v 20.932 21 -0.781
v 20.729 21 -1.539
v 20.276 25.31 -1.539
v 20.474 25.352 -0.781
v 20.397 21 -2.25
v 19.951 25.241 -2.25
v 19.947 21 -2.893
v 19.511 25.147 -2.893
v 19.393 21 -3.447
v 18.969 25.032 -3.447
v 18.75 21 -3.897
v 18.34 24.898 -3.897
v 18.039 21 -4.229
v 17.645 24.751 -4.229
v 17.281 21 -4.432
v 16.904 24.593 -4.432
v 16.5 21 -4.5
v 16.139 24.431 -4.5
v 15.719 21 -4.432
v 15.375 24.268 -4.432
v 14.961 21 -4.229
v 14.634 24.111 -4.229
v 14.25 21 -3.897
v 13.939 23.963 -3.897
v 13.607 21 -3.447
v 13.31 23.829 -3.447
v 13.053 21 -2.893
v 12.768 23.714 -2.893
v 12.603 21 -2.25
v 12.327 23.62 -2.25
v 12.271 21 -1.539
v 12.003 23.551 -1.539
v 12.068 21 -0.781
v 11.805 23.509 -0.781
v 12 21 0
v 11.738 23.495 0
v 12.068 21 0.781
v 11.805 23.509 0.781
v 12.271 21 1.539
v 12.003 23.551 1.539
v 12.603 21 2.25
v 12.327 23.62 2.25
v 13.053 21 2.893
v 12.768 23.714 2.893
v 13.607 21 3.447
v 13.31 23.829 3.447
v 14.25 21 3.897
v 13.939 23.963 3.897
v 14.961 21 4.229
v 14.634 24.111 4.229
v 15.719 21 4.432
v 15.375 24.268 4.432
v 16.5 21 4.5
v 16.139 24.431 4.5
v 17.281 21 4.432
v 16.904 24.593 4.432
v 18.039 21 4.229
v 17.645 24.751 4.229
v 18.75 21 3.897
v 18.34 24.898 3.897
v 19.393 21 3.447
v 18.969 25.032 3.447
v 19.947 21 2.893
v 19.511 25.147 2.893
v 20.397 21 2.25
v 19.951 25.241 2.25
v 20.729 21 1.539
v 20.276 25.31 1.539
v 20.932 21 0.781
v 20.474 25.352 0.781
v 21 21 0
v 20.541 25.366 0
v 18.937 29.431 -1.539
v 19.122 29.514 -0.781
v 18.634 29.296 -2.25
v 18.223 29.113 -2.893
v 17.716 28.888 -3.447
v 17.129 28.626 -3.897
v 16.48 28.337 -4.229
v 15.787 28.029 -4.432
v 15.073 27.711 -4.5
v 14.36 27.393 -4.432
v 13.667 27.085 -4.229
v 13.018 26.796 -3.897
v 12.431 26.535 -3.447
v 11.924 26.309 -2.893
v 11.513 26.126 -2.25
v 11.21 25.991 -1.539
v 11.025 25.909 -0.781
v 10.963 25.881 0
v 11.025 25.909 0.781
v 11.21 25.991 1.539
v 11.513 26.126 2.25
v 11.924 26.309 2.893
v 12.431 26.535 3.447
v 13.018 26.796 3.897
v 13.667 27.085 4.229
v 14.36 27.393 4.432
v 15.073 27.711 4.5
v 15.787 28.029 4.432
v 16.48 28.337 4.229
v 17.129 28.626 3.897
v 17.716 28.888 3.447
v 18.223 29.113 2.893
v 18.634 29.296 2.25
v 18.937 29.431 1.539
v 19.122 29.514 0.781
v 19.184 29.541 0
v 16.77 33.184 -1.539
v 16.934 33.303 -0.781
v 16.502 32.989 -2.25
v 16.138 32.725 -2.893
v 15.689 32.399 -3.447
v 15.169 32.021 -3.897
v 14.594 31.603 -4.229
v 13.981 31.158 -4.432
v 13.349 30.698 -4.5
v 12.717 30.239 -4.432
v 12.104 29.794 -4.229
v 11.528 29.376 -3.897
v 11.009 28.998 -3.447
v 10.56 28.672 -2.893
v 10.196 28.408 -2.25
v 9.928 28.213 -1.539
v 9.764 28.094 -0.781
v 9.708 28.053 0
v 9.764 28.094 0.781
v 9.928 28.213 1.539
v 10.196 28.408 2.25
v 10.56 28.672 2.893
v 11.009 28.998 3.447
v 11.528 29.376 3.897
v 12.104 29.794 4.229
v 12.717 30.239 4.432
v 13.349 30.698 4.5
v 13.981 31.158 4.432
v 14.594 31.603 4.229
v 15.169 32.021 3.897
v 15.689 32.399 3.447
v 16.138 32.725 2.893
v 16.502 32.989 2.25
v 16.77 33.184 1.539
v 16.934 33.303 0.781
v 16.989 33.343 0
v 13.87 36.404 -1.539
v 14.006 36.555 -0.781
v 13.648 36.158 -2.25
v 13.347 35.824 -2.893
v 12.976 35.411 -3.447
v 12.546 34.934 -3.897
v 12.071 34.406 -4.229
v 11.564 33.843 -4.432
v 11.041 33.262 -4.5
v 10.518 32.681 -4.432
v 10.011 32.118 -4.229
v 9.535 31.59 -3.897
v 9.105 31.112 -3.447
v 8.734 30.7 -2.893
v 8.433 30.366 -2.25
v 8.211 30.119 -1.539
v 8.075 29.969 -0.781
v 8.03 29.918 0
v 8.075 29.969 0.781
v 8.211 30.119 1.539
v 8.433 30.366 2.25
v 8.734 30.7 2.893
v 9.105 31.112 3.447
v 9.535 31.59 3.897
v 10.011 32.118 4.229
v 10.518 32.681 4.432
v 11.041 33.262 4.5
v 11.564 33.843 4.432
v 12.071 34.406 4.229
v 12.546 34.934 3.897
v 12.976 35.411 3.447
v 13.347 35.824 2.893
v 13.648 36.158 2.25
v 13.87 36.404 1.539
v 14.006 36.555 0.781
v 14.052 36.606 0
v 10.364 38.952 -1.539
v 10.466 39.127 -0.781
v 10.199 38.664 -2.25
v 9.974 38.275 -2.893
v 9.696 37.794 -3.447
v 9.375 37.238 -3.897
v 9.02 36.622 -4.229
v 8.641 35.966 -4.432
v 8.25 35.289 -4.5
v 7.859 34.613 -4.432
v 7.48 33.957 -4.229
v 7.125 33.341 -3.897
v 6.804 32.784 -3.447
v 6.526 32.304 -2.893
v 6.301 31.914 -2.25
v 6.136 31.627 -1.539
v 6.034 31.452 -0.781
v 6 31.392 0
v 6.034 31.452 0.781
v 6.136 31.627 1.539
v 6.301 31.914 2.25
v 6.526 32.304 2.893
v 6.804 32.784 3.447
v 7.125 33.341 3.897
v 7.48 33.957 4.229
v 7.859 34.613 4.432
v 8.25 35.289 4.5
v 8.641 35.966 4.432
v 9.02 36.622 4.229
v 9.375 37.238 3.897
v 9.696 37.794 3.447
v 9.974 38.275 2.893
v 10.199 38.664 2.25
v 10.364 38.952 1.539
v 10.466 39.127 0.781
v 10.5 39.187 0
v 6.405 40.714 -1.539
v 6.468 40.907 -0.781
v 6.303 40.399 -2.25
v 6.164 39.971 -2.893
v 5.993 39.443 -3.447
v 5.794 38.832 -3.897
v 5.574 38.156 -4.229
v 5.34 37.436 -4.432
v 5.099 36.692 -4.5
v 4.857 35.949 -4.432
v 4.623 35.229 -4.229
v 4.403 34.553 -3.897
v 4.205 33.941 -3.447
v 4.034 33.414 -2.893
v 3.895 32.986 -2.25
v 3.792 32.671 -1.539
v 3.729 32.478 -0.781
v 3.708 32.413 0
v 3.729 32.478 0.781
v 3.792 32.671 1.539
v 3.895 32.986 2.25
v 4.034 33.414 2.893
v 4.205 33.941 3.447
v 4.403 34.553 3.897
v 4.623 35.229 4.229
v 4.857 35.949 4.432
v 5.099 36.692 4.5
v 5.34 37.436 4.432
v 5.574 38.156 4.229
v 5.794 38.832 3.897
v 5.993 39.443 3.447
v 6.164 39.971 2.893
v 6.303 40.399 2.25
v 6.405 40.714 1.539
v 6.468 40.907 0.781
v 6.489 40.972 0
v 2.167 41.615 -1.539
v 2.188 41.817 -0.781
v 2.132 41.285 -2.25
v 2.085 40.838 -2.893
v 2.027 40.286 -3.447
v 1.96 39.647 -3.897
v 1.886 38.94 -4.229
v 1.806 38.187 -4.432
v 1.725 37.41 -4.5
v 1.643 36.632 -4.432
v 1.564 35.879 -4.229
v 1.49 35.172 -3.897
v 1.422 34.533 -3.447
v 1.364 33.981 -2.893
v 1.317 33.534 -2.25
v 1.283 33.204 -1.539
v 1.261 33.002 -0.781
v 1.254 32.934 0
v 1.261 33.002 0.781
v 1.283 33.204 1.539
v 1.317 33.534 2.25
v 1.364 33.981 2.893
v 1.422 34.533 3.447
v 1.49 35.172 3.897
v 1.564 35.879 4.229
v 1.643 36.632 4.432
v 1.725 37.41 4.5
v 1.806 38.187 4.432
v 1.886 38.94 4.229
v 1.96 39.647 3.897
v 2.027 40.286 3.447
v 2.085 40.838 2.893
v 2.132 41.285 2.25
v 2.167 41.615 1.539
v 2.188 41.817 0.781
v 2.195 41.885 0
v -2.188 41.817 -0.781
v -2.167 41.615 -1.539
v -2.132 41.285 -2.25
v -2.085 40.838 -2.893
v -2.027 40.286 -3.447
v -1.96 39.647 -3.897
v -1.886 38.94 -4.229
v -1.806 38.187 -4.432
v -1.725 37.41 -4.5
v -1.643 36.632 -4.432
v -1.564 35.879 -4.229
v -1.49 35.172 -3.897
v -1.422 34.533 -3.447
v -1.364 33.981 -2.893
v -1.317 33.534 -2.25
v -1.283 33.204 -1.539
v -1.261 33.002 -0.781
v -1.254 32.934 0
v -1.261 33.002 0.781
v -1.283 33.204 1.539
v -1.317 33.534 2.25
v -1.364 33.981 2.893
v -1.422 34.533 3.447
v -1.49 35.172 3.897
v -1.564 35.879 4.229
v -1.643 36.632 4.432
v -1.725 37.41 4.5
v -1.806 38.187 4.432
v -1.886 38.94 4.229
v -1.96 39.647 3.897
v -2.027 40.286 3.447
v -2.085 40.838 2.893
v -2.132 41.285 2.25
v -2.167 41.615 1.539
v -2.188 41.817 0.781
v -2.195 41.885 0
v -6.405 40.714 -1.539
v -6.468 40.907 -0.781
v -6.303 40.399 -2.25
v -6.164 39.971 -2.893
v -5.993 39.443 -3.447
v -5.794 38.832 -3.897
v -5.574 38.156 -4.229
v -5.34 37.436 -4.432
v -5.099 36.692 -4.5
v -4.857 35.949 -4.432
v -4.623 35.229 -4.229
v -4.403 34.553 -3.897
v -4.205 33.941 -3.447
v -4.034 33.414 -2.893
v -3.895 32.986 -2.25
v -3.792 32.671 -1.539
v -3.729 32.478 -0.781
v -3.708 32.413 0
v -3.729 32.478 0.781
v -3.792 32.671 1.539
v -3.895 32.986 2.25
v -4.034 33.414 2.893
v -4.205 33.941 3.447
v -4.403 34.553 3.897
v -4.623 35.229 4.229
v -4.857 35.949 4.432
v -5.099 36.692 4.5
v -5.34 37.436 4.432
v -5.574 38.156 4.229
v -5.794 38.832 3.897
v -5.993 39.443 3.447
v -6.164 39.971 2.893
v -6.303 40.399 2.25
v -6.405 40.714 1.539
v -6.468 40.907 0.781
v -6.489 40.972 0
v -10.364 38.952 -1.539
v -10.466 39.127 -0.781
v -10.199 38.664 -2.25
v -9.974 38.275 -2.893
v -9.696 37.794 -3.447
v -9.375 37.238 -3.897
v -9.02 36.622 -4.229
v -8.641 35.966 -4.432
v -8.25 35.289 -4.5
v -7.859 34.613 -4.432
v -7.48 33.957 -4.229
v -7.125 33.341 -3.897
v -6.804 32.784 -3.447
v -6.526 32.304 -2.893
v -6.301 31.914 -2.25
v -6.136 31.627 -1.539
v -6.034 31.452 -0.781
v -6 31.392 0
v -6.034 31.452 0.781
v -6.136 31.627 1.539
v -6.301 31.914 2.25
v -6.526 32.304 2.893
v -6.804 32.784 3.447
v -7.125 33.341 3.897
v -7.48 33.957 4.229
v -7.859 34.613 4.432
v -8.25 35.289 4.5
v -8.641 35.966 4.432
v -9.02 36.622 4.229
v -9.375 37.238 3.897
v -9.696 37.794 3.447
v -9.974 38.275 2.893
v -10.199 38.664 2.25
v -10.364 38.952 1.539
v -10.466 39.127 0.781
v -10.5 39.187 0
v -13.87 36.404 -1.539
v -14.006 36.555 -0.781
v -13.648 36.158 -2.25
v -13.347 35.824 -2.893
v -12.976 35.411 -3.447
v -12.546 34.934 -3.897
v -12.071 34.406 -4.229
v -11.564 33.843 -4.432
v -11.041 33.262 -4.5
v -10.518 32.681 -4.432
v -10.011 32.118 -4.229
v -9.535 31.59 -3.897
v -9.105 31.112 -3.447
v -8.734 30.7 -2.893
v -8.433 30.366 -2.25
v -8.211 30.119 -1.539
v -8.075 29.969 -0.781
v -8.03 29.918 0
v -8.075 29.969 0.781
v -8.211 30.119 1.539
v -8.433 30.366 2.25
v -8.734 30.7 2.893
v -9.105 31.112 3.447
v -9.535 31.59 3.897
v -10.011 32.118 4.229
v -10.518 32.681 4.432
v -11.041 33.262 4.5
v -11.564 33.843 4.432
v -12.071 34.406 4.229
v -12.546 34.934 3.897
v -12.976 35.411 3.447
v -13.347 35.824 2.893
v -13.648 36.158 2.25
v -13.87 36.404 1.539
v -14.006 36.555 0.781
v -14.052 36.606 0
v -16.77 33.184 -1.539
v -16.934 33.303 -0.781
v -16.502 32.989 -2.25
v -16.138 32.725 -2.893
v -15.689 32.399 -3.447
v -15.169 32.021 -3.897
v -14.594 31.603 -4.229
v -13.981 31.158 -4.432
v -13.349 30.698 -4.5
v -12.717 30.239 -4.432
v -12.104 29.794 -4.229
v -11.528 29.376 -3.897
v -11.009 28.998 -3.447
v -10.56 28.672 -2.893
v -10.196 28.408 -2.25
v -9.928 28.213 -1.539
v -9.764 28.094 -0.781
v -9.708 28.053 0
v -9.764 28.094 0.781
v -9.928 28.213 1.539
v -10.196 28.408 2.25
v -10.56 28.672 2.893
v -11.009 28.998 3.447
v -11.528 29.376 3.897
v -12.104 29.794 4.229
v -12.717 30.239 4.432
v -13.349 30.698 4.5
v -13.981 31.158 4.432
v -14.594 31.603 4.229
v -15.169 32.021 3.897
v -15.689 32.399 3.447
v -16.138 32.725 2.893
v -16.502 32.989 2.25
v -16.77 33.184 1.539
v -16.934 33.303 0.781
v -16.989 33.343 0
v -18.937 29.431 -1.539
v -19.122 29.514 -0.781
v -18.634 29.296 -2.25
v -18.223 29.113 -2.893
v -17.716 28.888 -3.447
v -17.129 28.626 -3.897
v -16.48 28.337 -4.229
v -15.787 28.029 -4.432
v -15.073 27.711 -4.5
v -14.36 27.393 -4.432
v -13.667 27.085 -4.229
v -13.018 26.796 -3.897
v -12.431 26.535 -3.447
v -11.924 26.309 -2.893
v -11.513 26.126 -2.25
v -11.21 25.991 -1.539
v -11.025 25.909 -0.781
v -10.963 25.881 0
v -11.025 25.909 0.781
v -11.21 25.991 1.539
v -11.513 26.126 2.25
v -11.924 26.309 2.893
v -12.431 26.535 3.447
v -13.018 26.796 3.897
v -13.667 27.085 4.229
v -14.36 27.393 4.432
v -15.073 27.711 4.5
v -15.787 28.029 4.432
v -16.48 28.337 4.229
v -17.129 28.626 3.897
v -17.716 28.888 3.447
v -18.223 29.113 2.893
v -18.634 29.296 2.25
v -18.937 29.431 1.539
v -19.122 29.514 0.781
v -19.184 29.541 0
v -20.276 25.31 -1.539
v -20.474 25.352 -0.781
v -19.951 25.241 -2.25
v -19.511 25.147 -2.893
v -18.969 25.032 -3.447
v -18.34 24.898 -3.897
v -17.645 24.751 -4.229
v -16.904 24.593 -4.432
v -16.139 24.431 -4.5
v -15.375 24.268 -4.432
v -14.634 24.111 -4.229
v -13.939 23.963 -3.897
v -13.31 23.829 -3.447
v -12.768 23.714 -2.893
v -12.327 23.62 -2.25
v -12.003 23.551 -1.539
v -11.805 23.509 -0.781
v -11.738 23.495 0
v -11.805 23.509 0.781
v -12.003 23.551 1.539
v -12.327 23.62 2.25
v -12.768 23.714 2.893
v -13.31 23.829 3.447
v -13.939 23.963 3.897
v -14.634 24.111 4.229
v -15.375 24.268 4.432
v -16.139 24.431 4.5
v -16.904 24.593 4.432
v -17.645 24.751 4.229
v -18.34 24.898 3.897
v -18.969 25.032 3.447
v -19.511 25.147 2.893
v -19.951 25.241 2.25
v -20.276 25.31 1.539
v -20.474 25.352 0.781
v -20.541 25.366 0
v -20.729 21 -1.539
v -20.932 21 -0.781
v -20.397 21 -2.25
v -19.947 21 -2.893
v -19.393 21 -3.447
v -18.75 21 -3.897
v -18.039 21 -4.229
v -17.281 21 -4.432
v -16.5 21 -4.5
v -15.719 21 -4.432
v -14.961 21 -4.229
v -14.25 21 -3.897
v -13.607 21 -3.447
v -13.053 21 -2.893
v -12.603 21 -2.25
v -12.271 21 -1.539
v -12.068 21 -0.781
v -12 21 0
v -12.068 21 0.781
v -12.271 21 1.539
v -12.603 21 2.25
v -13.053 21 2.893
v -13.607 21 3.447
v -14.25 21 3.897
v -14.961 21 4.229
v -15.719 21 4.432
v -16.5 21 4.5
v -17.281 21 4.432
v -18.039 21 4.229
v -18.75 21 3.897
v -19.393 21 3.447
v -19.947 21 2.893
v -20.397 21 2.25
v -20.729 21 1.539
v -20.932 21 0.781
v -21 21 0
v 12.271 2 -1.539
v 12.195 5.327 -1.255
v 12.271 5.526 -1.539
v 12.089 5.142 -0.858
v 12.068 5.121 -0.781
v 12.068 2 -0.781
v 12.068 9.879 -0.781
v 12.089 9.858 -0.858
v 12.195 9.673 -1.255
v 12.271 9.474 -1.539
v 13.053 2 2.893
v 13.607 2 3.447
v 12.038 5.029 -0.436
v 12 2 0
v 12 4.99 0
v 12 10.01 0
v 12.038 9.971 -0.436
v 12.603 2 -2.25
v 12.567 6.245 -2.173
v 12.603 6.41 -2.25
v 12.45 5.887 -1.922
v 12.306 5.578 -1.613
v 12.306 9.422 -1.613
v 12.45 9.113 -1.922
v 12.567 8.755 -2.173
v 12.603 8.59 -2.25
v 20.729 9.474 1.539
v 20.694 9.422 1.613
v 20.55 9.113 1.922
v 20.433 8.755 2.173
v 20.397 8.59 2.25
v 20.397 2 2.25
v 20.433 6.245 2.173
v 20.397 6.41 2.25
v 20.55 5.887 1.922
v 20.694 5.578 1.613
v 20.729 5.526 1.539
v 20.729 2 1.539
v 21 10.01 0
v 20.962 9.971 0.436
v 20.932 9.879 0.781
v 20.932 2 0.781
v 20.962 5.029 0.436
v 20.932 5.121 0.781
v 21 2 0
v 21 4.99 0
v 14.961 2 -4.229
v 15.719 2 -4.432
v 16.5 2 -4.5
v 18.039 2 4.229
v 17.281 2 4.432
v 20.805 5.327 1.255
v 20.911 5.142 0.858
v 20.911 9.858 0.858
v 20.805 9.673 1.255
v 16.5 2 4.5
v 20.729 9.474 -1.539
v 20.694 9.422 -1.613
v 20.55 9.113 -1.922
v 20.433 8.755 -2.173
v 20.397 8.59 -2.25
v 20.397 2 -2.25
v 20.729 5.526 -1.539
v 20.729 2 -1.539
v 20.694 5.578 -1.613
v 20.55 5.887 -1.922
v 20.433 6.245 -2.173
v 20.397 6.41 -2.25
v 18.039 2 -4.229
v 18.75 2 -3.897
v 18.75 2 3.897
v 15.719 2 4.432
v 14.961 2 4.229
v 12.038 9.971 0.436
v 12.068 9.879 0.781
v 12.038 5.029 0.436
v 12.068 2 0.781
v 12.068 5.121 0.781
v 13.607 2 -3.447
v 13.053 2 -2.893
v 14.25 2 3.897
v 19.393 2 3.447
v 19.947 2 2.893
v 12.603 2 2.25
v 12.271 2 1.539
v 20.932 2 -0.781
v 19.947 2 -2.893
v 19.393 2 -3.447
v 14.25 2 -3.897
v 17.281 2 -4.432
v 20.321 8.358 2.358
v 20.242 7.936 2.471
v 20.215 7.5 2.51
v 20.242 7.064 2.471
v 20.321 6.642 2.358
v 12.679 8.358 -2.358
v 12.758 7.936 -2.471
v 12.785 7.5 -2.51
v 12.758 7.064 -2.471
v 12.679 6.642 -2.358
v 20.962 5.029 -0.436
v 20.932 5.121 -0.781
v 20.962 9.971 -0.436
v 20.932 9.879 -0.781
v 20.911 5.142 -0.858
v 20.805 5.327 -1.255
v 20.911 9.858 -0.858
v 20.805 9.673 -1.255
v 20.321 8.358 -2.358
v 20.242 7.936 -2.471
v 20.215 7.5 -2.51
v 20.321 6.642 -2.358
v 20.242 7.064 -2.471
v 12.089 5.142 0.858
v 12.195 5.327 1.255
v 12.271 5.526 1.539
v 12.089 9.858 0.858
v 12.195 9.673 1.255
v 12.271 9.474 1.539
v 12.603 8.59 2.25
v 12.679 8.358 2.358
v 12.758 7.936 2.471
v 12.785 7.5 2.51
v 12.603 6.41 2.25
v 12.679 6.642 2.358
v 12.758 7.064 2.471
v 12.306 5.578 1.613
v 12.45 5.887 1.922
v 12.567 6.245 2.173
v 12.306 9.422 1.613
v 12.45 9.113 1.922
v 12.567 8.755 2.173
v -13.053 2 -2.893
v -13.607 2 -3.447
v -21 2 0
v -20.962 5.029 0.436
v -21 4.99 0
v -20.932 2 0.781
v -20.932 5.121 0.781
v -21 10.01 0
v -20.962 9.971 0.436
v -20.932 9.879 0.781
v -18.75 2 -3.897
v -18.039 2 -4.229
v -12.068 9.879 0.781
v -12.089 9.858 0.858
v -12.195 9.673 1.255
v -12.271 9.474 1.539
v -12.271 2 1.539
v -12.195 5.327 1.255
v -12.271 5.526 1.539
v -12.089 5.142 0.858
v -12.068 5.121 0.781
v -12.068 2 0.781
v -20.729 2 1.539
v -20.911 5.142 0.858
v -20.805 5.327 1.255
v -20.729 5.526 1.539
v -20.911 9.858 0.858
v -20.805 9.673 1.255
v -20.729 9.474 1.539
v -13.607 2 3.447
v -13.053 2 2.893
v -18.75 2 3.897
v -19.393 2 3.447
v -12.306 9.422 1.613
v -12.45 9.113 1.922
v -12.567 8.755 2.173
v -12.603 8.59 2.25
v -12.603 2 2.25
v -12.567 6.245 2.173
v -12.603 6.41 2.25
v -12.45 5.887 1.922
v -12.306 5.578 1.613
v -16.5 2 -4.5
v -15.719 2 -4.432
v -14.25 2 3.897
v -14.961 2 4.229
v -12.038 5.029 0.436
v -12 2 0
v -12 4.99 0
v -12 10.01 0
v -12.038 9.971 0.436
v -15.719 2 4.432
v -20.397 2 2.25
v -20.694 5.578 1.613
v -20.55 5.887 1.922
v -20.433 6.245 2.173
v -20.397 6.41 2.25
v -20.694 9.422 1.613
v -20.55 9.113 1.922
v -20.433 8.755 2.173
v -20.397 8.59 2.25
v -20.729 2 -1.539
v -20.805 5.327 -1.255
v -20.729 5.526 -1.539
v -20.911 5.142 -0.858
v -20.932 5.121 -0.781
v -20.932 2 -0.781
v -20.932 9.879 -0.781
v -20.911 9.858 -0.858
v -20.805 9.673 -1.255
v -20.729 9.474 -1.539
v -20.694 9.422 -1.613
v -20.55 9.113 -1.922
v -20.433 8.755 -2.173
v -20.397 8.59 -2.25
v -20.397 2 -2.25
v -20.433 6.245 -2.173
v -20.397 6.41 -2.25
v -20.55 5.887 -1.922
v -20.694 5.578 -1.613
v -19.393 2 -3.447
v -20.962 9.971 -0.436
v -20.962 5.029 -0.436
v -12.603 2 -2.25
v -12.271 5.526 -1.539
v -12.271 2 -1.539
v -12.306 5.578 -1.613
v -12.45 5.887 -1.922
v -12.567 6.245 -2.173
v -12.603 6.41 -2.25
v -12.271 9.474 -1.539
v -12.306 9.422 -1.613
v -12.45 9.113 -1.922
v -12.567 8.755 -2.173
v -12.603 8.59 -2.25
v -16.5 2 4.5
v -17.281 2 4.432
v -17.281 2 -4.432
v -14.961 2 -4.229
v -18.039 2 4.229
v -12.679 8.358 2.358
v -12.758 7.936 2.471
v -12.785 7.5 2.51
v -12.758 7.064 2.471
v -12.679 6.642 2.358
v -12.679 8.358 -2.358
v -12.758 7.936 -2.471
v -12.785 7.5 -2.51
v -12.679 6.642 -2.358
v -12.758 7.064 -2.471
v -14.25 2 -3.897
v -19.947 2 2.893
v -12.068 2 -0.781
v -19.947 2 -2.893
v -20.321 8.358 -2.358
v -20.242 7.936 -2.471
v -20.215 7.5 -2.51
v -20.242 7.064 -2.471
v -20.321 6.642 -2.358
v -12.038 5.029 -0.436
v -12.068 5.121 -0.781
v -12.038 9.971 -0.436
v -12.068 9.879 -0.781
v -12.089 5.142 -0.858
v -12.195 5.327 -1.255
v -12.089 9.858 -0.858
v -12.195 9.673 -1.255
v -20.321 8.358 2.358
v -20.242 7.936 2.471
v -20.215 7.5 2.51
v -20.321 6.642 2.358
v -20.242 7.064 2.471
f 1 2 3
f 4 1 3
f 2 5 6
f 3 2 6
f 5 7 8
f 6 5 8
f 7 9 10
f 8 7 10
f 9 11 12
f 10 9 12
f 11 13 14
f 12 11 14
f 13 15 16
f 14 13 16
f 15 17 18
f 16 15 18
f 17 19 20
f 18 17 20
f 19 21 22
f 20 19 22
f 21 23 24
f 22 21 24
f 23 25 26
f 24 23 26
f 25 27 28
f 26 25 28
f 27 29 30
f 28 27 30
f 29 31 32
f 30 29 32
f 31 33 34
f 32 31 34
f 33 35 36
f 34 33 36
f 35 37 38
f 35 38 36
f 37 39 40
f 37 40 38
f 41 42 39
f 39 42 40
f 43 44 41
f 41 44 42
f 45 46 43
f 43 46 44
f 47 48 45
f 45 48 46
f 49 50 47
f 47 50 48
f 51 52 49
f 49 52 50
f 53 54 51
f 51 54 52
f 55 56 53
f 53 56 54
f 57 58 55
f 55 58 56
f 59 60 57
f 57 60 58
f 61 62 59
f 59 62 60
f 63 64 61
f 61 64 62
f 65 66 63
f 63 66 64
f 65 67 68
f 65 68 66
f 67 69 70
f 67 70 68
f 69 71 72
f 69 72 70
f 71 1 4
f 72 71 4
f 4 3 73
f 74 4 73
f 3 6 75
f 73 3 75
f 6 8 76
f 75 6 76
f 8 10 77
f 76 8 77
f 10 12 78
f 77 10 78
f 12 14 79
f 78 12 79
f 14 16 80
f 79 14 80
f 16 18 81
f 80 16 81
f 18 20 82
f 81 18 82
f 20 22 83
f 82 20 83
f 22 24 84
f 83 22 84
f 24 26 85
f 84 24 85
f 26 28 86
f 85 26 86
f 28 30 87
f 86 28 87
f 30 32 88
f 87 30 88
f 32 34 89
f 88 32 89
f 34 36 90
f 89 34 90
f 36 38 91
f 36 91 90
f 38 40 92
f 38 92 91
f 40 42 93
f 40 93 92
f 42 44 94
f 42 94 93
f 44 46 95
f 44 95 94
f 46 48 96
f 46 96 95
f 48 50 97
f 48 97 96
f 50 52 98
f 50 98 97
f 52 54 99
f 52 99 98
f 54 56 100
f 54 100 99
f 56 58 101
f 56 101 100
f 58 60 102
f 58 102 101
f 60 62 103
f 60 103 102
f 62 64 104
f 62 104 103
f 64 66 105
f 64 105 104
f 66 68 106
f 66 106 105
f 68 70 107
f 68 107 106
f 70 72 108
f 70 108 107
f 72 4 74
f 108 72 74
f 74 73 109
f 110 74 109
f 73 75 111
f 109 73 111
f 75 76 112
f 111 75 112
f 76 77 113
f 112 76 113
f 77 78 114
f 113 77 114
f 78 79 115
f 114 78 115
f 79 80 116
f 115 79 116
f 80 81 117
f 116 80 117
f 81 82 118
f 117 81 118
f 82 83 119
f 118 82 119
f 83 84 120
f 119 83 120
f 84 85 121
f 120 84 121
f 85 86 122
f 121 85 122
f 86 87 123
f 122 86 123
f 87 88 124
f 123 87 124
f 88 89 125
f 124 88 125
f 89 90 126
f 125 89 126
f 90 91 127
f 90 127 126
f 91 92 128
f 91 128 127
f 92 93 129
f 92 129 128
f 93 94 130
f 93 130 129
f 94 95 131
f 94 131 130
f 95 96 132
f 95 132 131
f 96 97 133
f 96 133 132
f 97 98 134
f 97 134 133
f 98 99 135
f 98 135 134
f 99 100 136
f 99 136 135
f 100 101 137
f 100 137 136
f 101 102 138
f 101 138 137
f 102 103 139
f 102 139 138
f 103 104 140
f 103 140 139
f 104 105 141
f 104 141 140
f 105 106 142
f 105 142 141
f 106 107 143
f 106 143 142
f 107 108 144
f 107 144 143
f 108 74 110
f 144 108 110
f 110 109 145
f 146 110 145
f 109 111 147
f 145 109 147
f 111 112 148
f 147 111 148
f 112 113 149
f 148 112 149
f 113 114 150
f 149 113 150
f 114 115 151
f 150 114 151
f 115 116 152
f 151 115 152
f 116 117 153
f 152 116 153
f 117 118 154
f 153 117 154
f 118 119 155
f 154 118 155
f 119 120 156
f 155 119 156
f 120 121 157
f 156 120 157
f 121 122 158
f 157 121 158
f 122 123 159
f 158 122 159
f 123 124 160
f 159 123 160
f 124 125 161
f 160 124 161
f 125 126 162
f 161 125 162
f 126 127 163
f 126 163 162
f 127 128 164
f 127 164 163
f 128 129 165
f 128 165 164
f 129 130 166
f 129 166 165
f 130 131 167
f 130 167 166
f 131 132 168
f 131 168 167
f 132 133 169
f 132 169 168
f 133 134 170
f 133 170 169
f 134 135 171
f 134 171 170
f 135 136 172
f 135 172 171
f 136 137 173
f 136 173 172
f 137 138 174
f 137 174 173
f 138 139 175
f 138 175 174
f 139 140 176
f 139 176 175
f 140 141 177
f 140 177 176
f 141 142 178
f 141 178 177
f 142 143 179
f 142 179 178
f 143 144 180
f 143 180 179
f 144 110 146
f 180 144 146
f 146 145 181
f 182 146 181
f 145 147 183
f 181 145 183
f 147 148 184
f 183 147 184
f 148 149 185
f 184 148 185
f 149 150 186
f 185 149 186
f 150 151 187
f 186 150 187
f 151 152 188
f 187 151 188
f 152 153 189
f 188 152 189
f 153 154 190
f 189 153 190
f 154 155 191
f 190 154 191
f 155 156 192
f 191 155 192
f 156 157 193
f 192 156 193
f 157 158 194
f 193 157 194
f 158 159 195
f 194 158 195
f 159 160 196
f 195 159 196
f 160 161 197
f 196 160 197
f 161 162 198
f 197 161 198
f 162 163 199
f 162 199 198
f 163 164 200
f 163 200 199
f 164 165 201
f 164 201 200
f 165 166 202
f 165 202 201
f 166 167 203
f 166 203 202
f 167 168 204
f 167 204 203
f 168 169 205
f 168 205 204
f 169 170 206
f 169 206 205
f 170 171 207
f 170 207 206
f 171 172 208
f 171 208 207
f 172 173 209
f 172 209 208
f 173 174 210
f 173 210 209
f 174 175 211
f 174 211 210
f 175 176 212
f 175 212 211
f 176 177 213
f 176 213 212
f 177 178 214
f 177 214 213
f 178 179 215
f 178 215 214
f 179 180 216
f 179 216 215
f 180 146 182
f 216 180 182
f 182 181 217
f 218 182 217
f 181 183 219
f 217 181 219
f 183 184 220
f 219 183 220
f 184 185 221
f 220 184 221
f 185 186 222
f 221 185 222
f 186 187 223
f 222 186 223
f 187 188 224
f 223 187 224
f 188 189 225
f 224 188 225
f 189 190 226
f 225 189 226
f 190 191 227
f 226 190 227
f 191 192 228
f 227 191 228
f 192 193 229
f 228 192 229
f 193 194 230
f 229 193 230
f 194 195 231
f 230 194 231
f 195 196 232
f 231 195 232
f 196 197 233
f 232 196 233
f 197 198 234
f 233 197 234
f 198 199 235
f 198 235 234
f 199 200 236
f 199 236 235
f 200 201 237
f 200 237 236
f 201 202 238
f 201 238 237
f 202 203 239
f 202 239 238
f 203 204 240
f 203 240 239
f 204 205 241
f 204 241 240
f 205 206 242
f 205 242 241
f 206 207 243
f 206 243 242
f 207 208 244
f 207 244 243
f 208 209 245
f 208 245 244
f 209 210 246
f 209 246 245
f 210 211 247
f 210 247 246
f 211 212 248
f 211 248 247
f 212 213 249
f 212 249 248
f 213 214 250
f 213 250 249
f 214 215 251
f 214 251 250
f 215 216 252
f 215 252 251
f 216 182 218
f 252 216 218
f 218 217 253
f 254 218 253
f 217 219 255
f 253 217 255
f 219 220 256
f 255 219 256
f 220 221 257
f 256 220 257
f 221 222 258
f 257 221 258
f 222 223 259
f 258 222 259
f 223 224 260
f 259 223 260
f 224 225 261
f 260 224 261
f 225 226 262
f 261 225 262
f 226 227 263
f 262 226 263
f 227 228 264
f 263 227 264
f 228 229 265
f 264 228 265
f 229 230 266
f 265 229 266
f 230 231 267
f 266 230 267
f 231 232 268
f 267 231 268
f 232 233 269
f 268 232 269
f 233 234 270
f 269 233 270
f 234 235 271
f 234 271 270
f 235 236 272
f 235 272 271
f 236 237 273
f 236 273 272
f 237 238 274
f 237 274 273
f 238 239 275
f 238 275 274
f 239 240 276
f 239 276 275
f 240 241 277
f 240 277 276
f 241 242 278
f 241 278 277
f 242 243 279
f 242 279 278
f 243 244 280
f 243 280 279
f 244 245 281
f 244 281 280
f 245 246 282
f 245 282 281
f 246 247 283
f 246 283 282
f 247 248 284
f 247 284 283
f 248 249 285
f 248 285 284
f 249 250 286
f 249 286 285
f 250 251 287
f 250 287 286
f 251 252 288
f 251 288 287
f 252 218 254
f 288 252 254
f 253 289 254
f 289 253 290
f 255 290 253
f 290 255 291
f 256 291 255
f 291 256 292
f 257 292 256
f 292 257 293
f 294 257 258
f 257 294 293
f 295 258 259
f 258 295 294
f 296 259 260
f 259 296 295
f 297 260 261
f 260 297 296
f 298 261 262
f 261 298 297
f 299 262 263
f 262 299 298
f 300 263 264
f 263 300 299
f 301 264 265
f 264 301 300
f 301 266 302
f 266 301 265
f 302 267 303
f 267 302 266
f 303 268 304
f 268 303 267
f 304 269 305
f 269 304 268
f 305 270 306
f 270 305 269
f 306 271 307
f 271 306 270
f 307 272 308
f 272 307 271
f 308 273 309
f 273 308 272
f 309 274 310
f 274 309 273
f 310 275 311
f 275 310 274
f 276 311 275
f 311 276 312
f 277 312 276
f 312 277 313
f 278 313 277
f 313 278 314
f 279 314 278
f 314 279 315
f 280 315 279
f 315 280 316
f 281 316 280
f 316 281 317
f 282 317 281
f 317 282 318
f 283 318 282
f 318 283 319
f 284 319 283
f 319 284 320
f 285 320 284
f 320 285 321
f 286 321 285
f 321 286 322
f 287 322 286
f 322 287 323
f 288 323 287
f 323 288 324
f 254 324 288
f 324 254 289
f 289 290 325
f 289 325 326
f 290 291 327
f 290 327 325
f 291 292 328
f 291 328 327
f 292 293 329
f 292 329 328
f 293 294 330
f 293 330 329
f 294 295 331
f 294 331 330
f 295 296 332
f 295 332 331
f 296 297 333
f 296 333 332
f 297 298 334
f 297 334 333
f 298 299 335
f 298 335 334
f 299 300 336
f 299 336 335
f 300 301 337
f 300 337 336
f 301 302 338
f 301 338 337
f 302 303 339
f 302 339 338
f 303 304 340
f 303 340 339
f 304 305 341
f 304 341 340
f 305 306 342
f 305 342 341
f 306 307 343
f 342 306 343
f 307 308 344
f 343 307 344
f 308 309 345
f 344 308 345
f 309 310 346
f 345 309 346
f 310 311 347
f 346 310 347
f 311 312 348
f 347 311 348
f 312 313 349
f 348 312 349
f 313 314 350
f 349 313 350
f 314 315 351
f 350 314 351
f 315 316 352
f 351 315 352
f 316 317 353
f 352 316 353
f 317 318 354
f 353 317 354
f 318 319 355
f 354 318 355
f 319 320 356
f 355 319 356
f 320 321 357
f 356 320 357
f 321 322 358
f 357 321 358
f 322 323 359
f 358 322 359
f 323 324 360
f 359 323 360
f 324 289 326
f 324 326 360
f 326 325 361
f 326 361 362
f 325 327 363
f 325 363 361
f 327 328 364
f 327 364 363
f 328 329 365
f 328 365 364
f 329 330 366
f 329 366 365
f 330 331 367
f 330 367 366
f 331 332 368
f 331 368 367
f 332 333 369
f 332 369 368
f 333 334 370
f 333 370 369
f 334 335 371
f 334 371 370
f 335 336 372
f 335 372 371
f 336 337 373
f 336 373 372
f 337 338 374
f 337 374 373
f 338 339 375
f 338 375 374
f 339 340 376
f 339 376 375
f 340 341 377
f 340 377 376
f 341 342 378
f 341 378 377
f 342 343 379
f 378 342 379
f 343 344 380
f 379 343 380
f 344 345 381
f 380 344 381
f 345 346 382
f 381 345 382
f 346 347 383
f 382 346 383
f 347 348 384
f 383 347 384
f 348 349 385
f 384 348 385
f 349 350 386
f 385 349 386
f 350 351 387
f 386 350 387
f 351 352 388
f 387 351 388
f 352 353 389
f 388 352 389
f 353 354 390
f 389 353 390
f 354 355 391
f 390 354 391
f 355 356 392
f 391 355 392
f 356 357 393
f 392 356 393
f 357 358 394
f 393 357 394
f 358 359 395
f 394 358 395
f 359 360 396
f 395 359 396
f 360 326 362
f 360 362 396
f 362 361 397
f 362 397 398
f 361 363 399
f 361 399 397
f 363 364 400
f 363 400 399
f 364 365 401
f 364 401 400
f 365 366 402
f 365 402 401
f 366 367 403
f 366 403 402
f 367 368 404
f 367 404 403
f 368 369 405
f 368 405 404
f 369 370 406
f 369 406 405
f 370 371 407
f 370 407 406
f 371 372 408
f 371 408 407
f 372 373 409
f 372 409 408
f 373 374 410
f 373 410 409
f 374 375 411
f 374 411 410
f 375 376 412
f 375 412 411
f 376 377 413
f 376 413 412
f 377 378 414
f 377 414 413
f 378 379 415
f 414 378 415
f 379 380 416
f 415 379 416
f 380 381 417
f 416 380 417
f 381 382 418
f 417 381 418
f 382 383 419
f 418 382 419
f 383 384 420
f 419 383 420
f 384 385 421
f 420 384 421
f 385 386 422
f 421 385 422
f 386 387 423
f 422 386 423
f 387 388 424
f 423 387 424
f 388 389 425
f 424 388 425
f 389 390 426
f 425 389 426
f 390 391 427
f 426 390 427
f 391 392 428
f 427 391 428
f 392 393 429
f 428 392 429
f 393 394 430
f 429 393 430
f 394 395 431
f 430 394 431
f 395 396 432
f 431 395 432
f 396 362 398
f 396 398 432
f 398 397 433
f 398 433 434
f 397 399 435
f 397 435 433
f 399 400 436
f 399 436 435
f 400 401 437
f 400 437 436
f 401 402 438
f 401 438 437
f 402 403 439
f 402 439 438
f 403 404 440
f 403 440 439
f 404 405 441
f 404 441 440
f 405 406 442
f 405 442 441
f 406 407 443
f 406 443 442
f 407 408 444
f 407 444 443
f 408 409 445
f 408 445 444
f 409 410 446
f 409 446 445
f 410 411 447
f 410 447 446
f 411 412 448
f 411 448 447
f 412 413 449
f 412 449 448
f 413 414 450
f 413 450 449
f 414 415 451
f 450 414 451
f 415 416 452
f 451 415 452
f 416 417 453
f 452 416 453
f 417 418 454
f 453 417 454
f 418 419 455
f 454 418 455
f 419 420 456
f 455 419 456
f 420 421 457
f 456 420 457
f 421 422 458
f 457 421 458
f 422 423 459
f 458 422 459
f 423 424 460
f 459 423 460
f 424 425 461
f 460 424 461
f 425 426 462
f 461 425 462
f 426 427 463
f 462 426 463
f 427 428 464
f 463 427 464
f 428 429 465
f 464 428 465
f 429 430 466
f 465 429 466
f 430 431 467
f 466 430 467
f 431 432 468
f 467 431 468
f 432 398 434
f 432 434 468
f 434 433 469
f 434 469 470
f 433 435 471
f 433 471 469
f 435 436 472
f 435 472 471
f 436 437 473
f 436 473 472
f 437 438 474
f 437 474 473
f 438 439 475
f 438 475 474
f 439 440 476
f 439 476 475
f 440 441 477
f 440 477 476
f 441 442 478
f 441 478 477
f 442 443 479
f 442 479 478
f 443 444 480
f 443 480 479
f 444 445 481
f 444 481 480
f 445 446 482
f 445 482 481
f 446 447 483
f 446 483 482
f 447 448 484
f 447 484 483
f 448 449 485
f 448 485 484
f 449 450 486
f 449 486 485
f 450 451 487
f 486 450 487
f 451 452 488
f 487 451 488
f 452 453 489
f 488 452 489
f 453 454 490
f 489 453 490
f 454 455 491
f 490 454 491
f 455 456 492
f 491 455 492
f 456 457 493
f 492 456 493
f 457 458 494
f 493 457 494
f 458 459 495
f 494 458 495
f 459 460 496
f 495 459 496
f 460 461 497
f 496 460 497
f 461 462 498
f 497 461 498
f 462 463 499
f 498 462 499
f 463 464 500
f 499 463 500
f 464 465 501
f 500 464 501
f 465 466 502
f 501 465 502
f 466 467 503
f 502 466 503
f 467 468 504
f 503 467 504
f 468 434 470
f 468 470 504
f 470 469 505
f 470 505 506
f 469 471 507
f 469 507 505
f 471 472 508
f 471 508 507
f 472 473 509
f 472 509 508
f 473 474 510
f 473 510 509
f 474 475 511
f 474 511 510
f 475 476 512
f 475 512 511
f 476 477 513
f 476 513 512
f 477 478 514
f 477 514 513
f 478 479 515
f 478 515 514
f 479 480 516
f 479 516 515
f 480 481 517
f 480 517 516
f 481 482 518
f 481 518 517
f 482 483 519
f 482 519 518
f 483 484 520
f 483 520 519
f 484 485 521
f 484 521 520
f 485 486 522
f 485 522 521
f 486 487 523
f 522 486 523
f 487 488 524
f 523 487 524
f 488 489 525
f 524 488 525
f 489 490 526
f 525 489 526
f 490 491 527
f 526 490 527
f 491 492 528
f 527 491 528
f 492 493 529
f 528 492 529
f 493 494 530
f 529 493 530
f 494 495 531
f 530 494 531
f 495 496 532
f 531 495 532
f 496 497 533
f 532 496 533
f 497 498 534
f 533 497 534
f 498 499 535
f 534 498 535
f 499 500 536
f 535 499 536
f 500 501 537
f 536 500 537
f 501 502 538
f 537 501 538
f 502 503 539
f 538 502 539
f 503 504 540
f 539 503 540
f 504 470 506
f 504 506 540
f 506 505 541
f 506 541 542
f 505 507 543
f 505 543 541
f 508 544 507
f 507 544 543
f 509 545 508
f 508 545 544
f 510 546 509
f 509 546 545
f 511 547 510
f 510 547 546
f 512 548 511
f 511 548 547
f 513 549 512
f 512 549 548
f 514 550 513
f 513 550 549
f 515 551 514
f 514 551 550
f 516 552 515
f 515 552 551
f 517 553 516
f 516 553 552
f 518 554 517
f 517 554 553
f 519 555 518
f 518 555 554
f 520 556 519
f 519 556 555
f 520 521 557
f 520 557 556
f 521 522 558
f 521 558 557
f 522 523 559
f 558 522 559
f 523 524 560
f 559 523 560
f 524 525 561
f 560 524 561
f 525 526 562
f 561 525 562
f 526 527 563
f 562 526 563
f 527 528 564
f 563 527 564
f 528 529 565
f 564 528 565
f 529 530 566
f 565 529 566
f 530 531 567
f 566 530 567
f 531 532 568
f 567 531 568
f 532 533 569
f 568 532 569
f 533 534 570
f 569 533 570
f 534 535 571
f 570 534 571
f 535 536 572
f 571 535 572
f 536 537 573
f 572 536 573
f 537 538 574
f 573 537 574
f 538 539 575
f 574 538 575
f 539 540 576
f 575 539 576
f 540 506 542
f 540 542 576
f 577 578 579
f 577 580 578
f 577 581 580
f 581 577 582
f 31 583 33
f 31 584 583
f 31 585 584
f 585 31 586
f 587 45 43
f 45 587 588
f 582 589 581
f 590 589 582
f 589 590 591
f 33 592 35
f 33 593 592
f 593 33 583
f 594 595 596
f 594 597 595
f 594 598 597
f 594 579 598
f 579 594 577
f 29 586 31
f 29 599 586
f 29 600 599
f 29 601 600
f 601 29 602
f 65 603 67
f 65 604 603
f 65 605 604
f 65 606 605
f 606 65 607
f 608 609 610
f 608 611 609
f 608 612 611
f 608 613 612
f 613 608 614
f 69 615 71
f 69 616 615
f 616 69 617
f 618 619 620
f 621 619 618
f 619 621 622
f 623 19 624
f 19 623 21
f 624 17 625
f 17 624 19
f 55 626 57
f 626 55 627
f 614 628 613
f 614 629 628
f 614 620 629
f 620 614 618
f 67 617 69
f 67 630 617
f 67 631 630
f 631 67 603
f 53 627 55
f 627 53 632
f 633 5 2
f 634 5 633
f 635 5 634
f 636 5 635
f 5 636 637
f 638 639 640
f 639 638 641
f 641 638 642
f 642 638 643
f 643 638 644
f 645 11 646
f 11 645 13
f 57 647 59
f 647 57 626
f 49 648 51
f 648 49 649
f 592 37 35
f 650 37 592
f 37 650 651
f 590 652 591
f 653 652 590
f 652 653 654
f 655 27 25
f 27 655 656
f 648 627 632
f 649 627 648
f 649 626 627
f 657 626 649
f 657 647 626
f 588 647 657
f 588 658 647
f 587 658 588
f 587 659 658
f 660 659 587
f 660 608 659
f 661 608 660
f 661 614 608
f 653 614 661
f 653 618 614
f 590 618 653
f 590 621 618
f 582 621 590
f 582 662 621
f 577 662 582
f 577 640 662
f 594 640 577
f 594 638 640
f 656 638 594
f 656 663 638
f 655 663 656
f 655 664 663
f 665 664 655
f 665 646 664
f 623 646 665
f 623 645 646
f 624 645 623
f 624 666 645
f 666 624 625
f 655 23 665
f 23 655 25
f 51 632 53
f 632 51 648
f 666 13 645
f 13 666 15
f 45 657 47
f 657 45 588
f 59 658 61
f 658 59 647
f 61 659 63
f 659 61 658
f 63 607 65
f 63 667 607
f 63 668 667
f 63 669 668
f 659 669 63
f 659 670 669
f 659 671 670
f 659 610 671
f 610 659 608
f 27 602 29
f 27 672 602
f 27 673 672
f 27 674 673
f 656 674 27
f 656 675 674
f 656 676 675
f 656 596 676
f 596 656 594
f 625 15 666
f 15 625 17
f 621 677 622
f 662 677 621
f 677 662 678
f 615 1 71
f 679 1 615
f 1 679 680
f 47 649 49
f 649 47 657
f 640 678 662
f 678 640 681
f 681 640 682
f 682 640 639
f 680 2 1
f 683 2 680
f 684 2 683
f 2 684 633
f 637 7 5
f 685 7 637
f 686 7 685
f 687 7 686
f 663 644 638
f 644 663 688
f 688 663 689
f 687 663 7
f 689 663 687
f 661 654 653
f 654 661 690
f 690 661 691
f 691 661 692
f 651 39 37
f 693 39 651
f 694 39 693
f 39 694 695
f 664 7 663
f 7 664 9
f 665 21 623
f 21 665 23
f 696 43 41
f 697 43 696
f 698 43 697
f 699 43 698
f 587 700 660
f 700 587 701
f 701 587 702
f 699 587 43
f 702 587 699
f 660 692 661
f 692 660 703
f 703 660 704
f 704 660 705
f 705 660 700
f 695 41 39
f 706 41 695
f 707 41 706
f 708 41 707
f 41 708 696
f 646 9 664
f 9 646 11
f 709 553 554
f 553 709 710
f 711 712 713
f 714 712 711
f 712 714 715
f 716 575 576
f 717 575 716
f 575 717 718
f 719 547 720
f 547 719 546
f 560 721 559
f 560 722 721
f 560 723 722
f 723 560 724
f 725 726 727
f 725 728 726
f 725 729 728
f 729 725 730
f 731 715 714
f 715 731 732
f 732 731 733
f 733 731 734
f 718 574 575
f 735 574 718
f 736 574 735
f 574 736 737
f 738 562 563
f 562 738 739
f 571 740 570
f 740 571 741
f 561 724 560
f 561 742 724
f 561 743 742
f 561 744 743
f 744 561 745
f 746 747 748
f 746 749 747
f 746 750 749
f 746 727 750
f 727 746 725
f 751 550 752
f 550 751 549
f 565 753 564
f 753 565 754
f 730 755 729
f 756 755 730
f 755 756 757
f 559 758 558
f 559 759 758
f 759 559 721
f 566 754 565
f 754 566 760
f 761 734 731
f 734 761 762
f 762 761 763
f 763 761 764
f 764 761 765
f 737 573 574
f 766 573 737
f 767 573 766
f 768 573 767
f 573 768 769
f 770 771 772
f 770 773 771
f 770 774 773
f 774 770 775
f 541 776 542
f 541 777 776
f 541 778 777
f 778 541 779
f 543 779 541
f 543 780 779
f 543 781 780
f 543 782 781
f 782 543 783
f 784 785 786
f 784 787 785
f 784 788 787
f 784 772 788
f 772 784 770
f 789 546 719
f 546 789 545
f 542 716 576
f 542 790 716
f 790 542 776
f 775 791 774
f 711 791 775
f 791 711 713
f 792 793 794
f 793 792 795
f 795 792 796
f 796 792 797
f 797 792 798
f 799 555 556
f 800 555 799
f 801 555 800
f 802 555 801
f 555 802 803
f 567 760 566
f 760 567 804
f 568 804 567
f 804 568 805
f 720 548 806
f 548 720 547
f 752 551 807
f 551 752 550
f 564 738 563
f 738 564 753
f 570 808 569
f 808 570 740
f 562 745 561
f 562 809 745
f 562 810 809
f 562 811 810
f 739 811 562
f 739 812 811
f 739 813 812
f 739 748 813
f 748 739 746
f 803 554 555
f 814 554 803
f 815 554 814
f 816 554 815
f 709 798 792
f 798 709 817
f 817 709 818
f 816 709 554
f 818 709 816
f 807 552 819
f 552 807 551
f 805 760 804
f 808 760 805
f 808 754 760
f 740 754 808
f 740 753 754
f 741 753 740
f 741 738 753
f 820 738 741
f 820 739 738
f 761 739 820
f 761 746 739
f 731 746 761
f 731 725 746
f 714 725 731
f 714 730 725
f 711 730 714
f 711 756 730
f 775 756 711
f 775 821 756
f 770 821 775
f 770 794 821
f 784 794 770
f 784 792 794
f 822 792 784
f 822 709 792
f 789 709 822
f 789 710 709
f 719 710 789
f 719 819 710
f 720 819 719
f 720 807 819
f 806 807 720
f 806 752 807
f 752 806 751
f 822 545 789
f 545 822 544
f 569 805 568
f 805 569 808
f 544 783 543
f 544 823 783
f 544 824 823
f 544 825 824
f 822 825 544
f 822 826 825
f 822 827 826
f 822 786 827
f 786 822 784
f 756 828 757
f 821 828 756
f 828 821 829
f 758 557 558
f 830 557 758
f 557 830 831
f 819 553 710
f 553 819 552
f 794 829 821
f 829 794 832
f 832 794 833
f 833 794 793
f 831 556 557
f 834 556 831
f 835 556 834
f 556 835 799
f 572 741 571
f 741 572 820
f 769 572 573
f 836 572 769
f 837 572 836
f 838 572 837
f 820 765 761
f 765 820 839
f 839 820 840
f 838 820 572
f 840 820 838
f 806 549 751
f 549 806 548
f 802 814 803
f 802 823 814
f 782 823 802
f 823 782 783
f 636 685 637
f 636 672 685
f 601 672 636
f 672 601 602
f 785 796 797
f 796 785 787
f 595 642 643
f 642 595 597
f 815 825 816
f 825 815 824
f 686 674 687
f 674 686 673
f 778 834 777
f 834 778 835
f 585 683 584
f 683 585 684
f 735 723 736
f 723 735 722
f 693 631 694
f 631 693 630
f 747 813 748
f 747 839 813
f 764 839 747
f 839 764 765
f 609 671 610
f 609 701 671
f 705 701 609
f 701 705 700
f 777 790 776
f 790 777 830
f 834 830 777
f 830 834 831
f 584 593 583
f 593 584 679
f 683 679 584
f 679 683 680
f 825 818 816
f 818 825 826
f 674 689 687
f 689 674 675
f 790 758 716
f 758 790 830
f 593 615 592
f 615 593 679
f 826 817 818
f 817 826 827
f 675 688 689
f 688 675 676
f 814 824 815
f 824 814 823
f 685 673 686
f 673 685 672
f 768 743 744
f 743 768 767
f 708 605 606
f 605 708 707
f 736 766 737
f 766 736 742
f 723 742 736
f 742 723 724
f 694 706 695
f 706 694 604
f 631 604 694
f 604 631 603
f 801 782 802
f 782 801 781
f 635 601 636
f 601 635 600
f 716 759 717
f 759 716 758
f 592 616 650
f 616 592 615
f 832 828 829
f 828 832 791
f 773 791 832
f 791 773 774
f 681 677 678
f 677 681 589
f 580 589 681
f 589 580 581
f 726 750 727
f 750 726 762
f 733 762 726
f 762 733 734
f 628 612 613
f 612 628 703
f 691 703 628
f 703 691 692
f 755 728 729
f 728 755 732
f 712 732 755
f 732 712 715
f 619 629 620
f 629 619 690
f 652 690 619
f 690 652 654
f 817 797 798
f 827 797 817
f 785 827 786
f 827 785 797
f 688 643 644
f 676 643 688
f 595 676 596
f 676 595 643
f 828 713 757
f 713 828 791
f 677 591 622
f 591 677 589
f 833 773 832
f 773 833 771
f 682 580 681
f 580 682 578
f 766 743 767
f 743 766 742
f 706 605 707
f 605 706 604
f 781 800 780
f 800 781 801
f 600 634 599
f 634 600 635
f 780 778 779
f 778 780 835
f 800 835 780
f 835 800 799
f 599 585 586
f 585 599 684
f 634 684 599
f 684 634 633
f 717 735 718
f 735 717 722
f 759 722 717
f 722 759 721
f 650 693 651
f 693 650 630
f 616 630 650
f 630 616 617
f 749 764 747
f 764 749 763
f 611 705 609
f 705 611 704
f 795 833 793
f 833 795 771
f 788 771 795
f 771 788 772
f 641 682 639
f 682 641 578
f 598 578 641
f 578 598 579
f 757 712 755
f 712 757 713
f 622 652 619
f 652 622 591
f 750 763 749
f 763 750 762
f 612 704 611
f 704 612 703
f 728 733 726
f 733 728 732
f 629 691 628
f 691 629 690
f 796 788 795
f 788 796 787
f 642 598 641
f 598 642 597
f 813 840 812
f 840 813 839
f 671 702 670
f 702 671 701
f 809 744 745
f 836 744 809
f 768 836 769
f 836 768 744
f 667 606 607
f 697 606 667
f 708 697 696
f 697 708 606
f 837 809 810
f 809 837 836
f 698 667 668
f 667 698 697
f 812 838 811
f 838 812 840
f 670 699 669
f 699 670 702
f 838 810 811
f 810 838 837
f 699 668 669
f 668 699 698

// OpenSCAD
INNER_DIAMETER = 20;
OUTER_DIAMETER = 38;
KNOB_DISTANCE_FROM_CENTER = 42;
CABLE_DIAMETER = 4; // but round up
CABLE_SEPARATION = 15;
RING_DIAMETER = 9;

module cylinder_outer(height,radius,fn){
   fudge = 1/cos(180/fn);
   cylinder(h=height,r=radius*fudge,$fn=fn);}

module knob_model() {
    circle(d=INNER_DIAMETER, $rn=36);
    translate([0, 0, 5]) circle(d=OUTER_DIAMETER, $rn=36);
}

/*translate([0, KNOB_DISTANCE_FROM_CENTER / 2, 0]) {
    knob_model();
    translate([0, -1 * KNOB_DISTANCE_FROM_CENTER, 0]) knob_model();
}*/


difference() {
    translate([0, KNOB_DISTANCE_FROM_CENTER / 2, 0]) {
        union() {
            rotate_extrude(angle=180) translate([(RING_DIAMETER + INNER_DIAMETER + 4) / 2, 0, 0])  circle(d=RING_DIAMETER, $fn=36);
            CYLINDER_HEIGHT = (KNOB_DISTANCE_FROM_CENTER / 2) - 2;
            translate([(RING_DIAMETER + INNER_DIAMETER + 4) / 2, 0, 0]) rotate([90, 0, 0]) cylinder(d=RING_DIAMETER, h=CYLINDER_HEIGHT, $fn=36);
            translate([(RING_DIAMETER + INNER_DIAMETER + 4) / -2, 0, 0]) rotate([90, 0, 0]) cylinder(d=RING_DIAMETER, h=CYLINDER_HEIGHT, $fn=36);
        }
    }
    translate([-50, CABLE_SEPARATION/2, 0]) rotate([0, 90, 0]) cylinder_outer(100, (CABLE_DIAMETER + 1) / 2, 36);
}
